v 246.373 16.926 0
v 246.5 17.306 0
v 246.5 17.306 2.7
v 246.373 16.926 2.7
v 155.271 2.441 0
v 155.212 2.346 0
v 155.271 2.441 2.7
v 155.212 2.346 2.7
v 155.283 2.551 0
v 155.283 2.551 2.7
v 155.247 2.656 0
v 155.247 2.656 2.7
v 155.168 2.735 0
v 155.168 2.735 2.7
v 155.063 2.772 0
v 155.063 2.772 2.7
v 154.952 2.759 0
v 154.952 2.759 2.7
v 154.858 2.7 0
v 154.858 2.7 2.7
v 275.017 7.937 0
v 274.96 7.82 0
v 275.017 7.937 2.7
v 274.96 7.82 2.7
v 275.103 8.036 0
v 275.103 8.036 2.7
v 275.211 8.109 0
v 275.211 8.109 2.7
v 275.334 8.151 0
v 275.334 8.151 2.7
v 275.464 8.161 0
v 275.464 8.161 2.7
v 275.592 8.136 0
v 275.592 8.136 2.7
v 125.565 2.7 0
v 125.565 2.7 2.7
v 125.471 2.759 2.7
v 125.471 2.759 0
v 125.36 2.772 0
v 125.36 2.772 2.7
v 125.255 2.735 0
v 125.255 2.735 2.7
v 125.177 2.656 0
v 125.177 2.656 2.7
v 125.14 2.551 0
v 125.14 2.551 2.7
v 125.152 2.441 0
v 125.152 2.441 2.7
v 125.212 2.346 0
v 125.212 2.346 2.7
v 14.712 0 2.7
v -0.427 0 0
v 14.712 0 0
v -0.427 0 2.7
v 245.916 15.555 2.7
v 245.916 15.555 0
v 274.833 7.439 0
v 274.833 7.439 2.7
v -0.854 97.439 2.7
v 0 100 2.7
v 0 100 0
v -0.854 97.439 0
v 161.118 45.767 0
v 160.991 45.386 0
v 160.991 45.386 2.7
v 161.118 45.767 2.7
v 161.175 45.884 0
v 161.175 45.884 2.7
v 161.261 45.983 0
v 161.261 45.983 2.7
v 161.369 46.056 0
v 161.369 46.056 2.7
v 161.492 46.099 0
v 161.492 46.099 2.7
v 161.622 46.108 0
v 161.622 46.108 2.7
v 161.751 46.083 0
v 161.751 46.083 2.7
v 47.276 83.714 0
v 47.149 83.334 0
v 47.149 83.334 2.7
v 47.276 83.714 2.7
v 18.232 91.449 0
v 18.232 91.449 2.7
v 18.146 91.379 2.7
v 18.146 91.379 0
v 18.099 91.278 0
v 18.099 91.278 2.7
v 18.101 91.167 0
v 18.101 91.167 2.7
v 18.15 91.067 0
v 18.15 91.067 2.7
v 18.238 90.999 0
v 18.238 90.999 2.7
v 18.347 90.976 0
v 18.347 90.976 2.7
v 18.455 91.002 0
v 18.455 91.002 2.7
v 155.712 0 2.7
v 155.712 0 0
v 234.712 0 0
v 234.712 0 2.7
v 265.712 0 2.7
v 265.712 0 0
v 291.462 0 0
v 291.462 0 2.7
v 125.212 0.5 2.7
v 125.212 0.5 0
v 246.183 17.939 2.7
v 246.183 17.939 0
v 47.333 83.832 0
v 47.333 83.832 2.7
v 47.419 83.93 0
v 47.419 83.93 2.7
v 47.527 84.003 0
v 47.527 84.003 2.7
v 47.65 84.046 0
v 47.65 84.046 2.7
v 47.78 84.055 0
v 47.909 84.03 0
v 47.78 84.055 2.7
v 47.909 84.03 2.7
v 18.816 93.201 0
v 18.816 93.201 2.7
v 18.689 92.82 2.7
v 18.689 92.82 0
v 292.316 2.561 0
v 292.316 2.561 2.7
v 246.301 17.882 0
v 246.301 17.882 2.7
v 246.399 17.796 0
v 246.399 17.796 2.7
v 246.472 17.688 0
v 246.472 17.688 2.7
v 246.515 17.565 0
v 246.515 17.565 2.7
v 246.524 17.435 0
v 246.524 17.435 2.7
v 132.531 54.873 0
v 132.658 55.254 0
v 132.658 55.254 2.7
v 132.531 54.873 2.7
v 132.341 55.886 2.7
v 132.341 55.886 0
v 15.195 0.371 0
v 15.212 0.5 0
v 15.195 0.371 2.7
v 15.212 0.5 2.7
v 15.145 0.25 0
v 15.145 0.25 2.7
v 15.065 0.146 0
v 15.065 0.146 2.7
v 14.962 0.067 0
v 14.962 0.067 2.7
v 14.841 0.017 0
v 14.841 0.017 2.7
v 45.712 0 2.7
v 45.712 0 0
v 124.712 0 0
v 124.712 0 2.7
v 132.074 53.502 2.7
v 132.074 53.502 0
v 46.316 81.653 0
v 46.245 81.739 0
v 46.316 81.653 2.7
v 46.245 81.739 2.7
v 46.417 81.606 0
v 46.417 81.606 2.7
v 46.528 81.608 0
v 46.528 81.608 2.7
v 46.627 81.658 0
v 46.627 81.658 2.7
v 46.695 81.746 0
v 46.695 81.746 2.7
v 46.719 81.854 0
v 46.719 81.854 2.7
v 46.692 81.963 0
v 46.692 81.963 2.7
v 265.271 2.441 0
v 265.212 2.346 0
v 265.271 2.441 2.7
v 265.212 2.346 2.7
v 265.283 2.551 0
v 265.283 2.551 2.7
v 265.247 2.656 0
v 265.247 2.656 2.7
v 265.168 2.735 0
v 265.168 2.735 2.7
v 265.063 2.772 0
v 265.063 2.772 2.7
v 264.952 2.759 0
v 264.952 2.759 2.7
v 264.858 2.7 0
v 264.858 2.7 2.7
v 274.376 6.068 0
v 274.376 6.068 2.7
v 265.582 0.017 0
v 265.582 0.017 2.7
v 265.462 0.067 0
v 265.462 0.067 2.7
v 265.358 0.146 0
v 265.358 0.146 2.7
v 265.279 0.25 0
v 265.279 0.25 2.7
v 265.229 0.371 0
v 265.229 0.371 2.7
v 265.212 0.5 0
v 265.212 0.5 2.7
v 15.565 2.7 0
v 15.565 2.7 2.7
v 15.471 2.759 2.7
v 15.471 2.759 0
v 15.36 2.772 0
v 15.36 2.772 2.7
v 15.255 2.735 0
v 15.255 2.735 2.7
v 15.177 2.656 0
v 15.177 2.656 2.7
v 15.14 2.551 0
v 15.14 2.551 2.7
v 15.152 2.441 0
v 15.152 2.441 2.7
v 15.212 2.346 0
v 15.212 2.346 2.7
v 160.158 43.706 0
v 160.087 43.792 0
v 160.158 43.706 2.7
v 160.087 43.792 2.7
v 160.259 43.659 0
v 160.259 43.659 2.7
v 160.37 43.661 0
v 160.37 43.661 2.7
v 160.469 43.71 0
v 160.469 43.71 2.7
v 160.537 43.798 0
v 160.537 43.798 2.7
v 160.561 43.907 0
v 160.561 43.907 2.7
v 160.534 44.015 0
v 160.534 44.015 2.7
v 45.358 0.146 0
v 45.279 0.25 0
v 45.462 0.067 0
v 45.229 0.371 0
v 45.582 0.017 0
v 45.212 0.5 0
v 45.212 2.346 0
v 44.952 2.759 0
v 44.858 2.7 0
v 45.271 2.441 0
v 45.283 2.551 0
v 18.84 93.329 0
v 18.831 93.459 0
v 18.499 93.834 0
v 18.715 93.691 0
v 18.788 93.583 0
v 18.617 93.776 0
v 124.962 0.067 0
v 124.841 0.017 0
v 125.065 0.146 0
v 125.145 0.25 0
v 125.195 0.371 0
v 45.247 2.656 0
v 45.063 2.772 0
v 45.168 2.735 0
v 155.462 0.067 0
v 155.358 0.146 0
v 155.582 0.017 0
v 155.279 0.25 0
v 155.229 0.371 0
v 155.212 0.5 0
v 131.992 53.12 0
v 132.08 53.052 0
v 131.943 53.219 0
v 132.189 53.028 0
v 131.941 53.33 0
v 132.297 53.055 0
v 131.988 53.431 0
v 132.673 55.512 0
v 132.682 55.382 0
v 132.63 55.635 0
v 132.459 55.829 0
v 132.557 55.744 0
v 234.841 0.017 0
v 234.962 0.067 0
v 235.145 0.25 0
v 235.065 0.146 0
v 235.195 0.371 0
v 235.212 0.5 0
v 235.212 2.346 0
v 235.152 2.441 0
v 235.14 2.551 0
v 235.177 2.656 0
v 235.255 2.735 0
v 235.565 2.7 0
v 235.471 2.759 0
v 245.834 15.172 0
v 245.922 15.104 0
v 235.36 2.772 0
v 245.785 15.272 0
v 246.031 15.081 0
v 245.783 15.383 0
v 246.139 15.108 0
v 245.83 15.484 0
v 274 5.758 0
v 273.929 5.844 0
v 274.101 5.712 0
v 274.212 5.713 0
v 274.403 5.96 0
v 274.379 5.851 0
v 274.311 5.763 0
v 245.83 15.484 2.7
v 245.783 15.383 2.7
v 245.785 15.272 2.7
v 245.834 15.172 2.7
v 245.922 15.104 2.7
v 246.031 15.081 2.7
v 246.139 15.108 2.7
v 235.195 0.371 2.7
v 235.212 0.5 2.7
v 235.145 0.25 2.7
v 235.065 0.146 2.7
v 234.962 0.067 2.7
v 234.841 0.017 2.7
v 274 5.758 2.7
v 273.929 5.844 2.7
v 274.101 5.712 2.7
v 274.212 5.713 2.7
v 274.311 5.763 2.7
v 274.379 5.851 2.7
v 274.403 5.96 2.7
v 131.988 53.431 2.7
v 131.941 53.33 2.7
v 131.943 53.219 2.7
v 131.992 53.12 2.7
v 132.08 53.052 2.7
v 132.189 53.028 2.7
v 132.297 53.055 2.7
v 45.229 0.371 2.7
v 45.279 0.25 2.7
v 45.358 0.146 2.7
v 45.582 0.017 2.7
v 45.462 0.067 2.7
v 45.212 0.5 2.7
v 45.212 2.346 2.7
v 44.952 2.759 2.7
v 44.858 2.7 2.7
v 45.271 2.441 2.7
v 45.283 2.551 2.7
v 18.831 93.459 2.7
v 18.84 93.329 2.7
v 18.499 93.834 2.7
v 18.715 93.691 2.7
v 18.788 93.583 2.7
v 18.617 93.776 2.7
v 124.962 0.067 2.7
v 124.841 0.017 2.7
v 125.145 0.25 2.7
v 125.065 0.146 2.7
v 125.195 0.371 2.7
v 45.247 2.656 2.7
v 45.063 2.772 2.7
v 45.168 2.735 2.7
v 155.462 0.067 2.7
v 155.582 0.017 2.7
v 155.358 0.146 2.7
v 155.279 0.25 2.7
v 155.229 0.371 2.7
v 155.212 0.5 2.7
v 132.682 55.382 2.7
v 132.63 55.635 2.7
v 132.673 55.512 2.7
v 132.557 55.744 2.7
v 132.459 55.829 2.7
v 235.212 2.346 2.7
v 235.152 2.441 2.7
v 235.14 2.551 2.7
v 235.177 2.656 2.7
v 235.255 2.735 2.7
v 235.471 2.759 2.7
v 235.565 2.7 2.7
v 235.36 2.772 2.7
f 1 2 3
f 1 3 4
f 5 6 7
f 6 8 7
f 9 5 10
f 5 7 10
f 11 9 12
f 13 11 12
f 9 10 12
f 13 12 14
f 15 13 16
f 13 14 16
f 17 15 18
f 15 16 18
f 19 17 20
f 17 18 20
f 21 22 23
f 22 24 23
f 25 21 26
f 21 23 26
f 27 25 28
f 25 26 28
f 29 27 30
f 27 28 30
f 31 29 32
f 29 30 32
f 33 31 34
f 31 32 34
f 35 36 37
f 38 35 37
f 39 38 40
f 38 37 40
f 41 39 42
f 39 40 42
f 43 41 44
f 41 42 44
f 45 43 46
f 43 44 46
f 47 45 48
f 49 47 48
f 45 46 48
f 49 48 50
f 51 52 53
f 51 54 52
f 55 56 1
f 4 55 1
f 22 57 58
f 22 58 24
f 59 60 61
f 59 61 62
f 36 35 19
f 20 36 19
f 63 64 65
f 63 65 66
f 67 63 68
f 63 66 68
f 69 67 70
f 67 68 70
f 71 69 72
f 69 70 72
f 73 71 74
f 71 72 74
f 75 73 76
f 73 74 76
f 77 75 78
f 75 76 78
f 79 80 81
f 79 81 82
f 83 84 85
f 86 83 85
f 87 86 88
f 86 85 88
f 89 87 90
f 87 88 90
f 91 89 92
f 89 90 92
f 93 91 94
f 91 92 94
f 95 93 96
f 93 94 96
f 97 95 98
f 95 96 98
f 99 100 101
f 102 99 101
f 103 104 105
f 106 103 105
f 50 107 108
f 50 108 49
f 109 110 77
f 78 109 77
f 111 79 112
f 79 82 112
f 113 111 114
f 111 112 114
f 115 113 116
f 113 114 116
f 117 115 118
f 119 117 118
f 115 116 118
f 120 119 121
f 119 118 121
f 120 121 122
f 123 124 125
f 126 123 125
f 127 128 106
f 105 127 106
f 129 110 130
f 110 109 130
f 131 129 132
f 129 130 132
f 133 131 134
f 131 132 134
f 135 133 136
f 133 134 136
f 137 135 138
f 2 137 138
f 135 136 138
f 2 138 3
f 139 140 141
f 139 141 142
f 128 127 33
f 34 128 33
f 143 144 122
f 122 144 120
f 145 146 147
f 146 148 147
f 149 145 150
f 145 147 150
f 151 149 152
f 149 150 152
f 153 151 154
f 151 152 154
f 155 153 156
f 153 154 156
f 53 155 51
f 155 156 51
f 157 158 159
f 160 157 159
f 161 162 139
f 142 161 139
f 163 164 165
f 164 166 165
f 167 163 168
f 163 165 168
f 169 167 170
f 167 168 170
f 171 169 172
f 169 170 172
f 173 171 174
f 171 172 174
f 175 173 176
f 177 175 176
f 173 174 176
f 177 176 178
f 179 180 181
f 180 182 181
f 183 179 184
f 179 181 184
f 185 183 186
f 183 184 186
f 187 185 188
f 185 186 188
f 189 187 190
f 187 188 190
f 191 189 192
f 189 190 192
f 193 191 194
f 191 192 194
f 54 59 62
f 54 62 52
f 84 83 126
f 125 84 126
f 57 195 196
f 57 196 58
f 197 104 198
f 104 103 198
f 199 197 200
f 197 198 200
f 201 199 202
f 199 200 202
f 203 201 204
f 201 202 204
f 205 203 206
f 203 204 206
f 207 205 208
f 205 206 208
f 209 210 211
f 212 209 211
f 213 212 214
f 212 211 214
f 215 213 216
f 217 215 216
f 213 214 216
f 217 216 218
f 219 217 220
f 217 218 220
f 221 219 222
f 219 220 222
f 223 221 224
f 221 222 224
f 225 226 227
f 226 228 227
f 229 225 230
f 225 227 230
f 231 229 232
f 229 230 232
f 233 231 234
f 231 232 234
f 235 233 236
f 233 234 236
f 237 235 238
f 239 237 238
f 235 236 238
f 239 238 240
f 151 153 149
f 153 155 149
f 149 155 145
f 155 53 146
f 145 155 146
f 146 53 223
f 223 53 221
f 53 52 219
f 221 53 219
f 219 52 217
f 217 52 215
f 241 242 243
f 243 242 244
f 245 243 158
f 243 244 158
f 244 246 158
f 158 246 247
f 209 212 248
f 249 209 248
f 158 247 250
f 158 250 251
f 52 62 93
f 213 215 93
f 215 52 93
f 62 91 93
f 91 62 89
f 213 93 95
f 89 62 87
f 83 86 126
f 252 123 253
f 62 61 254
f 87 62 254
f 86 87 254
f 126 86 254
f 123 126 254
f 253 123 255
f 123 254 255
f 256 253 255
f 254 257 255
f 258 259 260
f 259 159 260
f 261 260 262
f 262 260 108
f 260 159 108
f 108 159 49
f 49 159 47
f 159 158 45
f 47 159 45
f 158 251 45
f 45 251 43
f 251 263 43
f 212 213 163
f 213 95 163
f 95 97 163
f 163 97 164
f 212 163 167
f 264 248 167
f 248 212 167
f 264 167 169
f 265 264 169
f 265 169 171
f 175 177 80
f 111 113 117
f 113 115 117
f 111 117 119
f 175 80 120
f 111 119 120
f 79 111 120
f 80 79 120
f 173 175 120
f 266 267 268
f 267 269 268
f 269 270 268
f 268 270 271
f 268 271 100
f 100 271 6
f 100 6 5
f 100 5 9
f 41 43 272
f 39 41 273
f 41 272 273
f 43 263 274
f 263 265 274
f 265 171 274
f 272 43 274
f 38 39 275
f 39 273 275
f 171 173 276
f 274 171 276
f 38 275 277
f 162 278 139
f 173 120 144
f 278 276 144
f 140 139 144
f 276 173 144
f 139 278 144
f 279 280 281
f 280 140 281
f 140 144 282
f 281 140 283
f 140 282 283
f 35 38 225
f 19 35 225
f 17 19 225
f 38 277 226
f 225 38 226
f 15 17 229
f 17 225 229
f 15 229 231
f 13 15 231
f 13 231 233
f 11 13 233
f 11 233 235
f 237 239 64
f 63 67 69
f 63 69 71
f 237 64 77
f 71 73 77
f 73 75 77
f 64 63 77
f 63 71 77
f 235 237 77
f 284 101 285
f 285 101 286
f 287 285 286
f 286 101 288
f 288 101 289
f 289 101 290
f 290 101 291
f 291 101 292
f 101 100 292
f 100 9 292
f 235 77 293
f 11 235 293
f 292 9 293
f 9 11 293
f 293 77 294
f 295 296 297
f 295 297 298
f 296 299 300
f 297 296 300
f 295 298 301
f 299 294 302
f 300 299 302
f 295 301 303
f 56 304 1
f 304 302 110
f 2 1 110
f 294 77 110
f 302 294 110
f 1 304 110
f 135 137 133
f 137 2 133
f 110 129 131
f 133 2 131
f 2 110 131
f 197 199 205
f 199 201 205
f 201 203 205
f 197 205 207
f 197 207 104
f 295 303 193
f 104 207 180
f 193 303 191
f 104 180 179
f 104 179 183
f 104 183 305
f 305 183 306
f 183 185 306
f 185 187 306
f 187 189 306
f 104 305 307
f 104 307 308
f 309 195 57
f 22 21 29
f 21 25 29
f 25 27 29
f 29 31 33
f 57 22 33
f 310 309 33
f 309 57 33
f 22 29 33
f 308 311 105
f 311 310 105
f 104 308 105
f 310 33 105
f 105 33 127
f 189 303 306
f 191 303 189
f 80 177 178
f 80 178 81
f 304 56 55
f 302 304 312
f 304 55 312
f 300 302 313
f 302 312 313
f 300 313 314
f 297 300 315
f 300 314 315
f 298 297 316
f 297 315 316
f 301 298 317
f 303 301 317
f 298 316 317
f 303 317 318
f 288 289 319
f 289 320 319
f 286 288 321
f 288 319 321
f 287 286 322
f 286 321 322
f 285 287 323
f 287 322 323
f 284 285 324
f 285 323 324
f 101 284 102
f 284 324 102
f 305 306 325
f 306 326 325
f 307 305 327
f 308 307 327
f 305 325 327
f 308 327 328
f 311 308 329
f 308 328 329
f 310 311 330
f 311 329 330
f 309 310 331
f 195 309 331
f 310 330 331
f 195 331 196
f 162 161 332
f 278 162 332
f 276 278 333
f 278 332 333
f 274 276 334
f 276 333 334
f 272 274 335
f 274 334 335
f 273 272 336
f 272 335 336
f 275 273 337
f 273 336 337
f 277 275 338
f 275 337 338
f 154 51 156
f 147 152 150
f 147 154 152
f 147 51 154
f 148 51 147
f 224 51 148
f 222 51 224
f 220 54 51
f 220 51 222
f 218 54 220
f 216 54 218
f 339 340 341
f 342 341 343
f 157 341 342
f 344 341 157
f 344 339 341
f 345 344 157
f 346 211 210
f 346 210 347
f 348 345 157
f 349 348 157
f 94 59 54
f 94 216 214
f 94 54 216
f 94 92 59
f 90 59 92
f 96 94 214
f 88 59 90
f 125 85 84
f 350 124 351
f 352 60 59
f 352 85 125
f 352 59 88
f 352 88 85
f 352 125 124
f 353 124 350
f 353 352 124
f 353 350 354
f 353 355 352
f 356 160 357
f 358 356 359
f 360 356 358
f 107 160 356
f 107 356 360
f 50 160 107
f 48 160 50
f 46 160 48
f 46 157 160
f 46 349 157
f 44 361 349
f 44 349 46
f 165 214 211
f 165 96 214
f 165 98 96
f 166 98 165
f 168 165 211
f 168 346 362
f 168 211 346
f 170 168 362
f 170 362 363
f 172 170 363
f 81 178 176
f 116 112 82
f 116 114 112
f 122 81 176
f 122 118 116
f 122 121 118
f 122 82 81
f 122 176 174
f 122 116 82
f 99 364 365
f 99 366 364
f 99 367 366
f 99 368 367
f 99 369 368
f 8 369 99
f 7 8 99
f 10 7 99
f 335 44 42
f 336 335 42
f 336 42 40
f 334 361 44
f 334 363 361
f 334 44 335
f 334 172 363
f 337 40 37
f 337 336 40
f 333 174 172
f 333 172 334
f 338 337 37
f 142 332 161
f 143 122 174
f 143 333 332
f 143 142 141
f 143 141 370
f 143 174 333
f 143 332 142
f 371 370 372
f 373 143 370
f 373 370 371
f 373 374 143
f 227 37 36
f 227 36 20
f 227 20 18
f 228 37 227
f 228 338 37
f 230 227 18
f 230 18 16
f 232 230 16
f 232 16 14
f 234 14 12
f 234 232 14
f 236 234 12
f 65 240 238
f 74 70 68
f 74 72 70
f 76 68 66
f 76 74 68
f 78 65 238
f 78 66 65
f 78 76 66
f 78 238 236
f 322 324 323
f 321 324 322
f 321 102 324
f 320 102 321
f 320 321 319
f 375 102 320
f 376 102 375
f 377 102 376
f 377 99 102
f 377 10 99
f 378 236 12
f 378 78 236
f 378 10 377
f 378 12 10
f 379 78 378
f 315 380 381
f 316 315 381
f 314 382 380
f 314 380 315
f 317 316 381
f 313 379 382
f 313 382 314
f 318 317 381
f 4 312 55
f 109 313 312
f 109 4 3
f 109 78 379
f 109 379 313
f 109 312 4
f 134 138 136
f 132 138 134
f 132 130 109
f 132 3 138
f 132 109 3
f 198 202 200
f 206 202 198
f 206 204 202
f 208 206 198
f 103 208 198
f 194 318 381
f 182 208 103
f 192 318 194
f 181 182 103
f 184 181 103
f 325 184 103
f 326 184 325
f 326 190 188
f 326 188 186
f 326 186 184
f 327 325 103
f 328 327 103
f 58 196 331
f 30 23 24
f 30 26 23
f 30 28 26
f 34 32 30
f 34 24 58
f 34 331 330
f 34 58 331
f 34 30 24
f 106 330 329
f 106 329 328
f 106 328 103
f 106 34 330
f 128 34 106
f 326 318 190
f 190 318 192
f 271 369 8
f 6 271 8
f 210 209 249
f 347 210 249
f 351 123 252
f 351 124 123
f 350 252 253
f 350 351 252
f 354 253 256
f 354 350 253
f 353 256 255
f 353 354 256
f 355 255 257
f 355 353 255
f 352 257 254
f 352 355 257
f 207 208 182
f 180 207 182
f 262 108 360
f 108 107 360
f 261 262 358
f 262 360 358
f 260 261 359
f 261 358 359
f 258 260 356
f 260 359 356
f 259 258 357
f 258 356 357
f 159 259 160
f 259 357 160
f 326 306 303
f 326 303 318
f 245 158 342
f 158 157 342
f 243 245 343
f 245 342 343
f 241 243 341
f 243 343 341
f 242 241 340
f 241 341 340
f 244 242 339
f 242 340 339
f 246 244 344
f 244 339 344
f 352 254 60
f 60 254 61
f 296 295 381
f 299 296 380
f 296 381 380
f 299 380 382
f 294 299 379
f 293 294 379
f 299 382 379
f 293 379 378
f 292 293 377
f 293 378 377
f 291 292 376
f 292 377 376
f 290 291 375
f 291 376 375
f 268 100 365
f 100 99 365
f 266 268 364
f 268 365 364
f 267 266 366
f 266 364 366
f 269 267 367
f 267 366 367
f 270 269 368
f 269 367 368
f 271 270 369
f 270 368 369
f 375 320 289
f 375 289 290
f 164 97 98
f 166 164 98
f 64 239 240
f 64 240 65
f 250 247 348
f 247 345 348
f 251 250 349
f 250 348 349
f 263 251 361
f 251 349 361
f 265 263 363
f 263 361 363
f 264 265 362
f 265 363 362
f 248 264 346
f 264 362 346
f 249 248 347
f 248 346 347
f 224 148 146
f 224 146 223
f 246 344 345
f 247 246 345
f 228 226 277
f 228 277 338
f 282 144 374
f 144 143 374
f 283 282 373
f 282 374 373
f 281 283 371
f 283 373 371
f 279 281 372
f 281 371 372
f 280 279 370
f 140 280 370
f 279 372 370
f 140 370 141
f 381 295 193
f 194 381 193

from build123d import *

# Parameters (mm, degrees)
BOSS_EXTRUDE1_DEPTH = 2.7
CAVITY1_OUTLINE_W   = 30
CAVITY1_OUTLINE_H   = 2.7
CAVITY1_DEPTH       = 2.7
CAVITY2_START       = -11.622776602
CAVITY2_OUTLINE_W   = 1.798654648
CAVITY2_OUTLINE_H   = 2.7
CAVITY2_DEPTH       = 30
CAVITY2_START_2     = 108.377223398
CAVITY2_2_OUTLINE_W = 1.798654648
CAVITY2_2_OUTLINE_H = 2.7
CAVITY2_2_DEPTH     = 30
CAVITY2_START_3     = 228.377223398
CAVITY2_3_OUTLINE_W = 1.798654648
CAVITY2_3_OUTLINE_H = 2.7
CAVITY2_3_DEPTH     = 30
CUT_EXTRUDE1_DEPTH  = 317.239292309
BOSS_EXTRUDE3_DEPTH = 2.7
SKETCH7_R           = 0.25
CUT_EXTRUDE2_DEPTH  = 2.7
FILLET2_R           = 0.5


# Read off the part's stored shape, not the designer's step: Cavity1, Cavity2
with BuildPart() as part:
    # Sketch1 → Boss-Extrude1 (new body)
    with BuildSketch(Plane.XY):
        Polygon((0, 0), (300, 0), (0, 100), align=None)
    extrude(amount=BOSS_EXTRUDE1_DEPTH)

    # Cavity1 outline → Cavity1 (cut)
    with BuildSketch(Plane.XY):
        with Locations((30.21166892, 1.35)):
            Rectangle(CAVITY1_OUTLINE_W, CAVITY1_OUTLINE_H)
        Polygon((47.149134475, 83.333520418), (47.434164903, 84.188611699), (18.973665961, 93.67544468), (18.688635534, 92.820353398), align=None)
        Polygon((160.991130241, 45.386188495), (161.276160669, 46.241279777), (132.815661727, 55.728112758), (132.5306313, 54.873021476), align=None)
        Polygon((274.833126007, 7.438856573), (275.118156435, 8.293947855), (246.657657493, 17.780780836), (246.372627066, 16.925689554), align=None)
        with Locations((250.21166892, 1.35)):
            Rectangle(CAVITY1_OUTLINE_W, CAVITY1_OUTLINE_H)
        with Locations((140.21166892, 1.35)):
            Rectangle(CAVITY1_OUTLINE_W, CAVITY1_OUTLINE_H)
    extrude(amount=CAVITY1_DEPTH, mode=Mode.SUBTRACT)

    # Cavity2 outline → Cavity2 (cut)
    with BuildSketch(Plane(origin=(0, 0, 0), x_dir=(0.316227766016832, 0.9486832980505158, 0), z_dir=(0.9486832980505159, -0.316227766016832, 0)).offset(CAVITY2_START)):
        with Locations((93.067657129, 1.35)):
            Rectangle(CAVITY2_OUTLINE_W, CAVITY2_OUTLINE_H)
    extrude(amount=CAVITY2_DEPTH, mode=Mode.SUBTRACT)

    # Cavity2 2 outline → Cavity2 2 (cut)
    with BuildSketch(Plane(origin=(0, 0, 0), x_dir=(0.316227766016832, 0.9486832980505158, 0), z_dir=(0.9486832980505159, -0.316227766016832, 0)).offset(CAVITY2_START_2)):
        with Locations((93.067657129, 1.35)):
            Rectangle(CAVITY2_2_OUTLINE_W, CAVITY2_2_OUTLINE_H)
    extrude(amount=CAVITY2_2_DEPTH, mode=Mode.SUBTRACT)

    # Cavity2 3 outline → Cavity2 3 (cut)
    with BuildSketch(Plane(origin=(0, 0, 0), x_dir=(0.316227766016832, 0.9486832980505158, 0), z_dir=(0.9486832980505159, -0.316227766016832, 0)).offset(CAVITY2_START_3)):
        with Locations((93.067657129, 1.35)):
            Rectangle(CAVITY2_3_OUTLINE_W, CAVITY2_3_OUTLINE_H)
    extrude(amount=CAVITY2_3_DEPTH, mode=Mode.SUBTRACT)

    # Sketch4 → Cut-Extrude1 (cut, through all)
    with BuildSketch(Plane.XY.offset(2.7)):
        Polygon((292.315665286, 2.561444905), (291.461850318, 0), (300, 0), align=None)
    extrude(amount=-CUT_EXTRUDE1_DEPTH, mode=Mode.SUBTRACT)

    # Sketch5 → Boss-Extrude3 (add)
    with BuildSketch(Plane.XY.offset(2.7)):
        Polygon((0, 100), (-0.853814968, 97.438555095), (-0.426907484, 0), (0, 0), align=None)
    extrude(amount=-BOSS_EXTRUDE3_DEPTH)

    # Sketch7 → Cut-Extrude2 (cut)
    with BuildSketch(Plane.XY.offset(2.7)):
        with Locations((18.343457791, 91.225803174)):
            Circle(SKETCH7_R)
        with Locations((132.185453557, 53.278471252)):
            Circle(SKETCH7_R)
        with Locations((46.468546535, 81.850773592)):
            Circle(SKETCH7_R)
        with Locations((160.310542301, 43.90344167)):
            Circle(SKETCH7_R)
        with Locations((246.027449323, 15.33113933)):
            Circle(SKETCH7_R)
        with Locations((274.152538068, 5.956109748)):
            Circle(SKETCH7_R)
        with Locations((265.034892224, 2.523223305)):
            Circle(SKETCH7_R)
        with Locations((235.388445615, 2.523223305)):
            Circle(SKETCH7_R)
        with Locations((155.034892224, 2.523223305)):
            Circle(SKETCH7_R)
        with Locations((125.388445615, 2.523223305)):
            Circle(SKETCH7_R)
        with Locations((45.034892224, 2.523223305)):
            Circle(SKETCH7_R)
        with Locations((15.388445615, 2.523223305)):
            Circle(SKETCH7_R)
    extrude(amount=-CUT_EXTRUDE2_DEPTH, mode=Mode.SUBTRACT)

    # Fillet2
    fillet2_edges = [part.edges().sort_by_distance(p)[0] for p in [
        (18.973665961, 93.67544468, 1.35),
        (47.434164903, 84.188611699, 1.35),
        (132.815661727, 55.728112758, 1.35),
        (161.276160669, 46.241279777, 1.35),
        (246.657657493, 17.780780836, 1.35),
        (275.118156435, 8.293947855, 1.35),
        (235.21166892, 0, 1.35),
        (125.21166892, 0, 1.35),
        (15.21166892, 0, 1.35),
        (265.21166892, 0, 1.35),
        (155.21166892, 0, 1.35),
        (45.21166892, 0, 1.35),
    ]]
    fillet(fillet2_edges, radius=FILLET2_R)


solid = part.part
